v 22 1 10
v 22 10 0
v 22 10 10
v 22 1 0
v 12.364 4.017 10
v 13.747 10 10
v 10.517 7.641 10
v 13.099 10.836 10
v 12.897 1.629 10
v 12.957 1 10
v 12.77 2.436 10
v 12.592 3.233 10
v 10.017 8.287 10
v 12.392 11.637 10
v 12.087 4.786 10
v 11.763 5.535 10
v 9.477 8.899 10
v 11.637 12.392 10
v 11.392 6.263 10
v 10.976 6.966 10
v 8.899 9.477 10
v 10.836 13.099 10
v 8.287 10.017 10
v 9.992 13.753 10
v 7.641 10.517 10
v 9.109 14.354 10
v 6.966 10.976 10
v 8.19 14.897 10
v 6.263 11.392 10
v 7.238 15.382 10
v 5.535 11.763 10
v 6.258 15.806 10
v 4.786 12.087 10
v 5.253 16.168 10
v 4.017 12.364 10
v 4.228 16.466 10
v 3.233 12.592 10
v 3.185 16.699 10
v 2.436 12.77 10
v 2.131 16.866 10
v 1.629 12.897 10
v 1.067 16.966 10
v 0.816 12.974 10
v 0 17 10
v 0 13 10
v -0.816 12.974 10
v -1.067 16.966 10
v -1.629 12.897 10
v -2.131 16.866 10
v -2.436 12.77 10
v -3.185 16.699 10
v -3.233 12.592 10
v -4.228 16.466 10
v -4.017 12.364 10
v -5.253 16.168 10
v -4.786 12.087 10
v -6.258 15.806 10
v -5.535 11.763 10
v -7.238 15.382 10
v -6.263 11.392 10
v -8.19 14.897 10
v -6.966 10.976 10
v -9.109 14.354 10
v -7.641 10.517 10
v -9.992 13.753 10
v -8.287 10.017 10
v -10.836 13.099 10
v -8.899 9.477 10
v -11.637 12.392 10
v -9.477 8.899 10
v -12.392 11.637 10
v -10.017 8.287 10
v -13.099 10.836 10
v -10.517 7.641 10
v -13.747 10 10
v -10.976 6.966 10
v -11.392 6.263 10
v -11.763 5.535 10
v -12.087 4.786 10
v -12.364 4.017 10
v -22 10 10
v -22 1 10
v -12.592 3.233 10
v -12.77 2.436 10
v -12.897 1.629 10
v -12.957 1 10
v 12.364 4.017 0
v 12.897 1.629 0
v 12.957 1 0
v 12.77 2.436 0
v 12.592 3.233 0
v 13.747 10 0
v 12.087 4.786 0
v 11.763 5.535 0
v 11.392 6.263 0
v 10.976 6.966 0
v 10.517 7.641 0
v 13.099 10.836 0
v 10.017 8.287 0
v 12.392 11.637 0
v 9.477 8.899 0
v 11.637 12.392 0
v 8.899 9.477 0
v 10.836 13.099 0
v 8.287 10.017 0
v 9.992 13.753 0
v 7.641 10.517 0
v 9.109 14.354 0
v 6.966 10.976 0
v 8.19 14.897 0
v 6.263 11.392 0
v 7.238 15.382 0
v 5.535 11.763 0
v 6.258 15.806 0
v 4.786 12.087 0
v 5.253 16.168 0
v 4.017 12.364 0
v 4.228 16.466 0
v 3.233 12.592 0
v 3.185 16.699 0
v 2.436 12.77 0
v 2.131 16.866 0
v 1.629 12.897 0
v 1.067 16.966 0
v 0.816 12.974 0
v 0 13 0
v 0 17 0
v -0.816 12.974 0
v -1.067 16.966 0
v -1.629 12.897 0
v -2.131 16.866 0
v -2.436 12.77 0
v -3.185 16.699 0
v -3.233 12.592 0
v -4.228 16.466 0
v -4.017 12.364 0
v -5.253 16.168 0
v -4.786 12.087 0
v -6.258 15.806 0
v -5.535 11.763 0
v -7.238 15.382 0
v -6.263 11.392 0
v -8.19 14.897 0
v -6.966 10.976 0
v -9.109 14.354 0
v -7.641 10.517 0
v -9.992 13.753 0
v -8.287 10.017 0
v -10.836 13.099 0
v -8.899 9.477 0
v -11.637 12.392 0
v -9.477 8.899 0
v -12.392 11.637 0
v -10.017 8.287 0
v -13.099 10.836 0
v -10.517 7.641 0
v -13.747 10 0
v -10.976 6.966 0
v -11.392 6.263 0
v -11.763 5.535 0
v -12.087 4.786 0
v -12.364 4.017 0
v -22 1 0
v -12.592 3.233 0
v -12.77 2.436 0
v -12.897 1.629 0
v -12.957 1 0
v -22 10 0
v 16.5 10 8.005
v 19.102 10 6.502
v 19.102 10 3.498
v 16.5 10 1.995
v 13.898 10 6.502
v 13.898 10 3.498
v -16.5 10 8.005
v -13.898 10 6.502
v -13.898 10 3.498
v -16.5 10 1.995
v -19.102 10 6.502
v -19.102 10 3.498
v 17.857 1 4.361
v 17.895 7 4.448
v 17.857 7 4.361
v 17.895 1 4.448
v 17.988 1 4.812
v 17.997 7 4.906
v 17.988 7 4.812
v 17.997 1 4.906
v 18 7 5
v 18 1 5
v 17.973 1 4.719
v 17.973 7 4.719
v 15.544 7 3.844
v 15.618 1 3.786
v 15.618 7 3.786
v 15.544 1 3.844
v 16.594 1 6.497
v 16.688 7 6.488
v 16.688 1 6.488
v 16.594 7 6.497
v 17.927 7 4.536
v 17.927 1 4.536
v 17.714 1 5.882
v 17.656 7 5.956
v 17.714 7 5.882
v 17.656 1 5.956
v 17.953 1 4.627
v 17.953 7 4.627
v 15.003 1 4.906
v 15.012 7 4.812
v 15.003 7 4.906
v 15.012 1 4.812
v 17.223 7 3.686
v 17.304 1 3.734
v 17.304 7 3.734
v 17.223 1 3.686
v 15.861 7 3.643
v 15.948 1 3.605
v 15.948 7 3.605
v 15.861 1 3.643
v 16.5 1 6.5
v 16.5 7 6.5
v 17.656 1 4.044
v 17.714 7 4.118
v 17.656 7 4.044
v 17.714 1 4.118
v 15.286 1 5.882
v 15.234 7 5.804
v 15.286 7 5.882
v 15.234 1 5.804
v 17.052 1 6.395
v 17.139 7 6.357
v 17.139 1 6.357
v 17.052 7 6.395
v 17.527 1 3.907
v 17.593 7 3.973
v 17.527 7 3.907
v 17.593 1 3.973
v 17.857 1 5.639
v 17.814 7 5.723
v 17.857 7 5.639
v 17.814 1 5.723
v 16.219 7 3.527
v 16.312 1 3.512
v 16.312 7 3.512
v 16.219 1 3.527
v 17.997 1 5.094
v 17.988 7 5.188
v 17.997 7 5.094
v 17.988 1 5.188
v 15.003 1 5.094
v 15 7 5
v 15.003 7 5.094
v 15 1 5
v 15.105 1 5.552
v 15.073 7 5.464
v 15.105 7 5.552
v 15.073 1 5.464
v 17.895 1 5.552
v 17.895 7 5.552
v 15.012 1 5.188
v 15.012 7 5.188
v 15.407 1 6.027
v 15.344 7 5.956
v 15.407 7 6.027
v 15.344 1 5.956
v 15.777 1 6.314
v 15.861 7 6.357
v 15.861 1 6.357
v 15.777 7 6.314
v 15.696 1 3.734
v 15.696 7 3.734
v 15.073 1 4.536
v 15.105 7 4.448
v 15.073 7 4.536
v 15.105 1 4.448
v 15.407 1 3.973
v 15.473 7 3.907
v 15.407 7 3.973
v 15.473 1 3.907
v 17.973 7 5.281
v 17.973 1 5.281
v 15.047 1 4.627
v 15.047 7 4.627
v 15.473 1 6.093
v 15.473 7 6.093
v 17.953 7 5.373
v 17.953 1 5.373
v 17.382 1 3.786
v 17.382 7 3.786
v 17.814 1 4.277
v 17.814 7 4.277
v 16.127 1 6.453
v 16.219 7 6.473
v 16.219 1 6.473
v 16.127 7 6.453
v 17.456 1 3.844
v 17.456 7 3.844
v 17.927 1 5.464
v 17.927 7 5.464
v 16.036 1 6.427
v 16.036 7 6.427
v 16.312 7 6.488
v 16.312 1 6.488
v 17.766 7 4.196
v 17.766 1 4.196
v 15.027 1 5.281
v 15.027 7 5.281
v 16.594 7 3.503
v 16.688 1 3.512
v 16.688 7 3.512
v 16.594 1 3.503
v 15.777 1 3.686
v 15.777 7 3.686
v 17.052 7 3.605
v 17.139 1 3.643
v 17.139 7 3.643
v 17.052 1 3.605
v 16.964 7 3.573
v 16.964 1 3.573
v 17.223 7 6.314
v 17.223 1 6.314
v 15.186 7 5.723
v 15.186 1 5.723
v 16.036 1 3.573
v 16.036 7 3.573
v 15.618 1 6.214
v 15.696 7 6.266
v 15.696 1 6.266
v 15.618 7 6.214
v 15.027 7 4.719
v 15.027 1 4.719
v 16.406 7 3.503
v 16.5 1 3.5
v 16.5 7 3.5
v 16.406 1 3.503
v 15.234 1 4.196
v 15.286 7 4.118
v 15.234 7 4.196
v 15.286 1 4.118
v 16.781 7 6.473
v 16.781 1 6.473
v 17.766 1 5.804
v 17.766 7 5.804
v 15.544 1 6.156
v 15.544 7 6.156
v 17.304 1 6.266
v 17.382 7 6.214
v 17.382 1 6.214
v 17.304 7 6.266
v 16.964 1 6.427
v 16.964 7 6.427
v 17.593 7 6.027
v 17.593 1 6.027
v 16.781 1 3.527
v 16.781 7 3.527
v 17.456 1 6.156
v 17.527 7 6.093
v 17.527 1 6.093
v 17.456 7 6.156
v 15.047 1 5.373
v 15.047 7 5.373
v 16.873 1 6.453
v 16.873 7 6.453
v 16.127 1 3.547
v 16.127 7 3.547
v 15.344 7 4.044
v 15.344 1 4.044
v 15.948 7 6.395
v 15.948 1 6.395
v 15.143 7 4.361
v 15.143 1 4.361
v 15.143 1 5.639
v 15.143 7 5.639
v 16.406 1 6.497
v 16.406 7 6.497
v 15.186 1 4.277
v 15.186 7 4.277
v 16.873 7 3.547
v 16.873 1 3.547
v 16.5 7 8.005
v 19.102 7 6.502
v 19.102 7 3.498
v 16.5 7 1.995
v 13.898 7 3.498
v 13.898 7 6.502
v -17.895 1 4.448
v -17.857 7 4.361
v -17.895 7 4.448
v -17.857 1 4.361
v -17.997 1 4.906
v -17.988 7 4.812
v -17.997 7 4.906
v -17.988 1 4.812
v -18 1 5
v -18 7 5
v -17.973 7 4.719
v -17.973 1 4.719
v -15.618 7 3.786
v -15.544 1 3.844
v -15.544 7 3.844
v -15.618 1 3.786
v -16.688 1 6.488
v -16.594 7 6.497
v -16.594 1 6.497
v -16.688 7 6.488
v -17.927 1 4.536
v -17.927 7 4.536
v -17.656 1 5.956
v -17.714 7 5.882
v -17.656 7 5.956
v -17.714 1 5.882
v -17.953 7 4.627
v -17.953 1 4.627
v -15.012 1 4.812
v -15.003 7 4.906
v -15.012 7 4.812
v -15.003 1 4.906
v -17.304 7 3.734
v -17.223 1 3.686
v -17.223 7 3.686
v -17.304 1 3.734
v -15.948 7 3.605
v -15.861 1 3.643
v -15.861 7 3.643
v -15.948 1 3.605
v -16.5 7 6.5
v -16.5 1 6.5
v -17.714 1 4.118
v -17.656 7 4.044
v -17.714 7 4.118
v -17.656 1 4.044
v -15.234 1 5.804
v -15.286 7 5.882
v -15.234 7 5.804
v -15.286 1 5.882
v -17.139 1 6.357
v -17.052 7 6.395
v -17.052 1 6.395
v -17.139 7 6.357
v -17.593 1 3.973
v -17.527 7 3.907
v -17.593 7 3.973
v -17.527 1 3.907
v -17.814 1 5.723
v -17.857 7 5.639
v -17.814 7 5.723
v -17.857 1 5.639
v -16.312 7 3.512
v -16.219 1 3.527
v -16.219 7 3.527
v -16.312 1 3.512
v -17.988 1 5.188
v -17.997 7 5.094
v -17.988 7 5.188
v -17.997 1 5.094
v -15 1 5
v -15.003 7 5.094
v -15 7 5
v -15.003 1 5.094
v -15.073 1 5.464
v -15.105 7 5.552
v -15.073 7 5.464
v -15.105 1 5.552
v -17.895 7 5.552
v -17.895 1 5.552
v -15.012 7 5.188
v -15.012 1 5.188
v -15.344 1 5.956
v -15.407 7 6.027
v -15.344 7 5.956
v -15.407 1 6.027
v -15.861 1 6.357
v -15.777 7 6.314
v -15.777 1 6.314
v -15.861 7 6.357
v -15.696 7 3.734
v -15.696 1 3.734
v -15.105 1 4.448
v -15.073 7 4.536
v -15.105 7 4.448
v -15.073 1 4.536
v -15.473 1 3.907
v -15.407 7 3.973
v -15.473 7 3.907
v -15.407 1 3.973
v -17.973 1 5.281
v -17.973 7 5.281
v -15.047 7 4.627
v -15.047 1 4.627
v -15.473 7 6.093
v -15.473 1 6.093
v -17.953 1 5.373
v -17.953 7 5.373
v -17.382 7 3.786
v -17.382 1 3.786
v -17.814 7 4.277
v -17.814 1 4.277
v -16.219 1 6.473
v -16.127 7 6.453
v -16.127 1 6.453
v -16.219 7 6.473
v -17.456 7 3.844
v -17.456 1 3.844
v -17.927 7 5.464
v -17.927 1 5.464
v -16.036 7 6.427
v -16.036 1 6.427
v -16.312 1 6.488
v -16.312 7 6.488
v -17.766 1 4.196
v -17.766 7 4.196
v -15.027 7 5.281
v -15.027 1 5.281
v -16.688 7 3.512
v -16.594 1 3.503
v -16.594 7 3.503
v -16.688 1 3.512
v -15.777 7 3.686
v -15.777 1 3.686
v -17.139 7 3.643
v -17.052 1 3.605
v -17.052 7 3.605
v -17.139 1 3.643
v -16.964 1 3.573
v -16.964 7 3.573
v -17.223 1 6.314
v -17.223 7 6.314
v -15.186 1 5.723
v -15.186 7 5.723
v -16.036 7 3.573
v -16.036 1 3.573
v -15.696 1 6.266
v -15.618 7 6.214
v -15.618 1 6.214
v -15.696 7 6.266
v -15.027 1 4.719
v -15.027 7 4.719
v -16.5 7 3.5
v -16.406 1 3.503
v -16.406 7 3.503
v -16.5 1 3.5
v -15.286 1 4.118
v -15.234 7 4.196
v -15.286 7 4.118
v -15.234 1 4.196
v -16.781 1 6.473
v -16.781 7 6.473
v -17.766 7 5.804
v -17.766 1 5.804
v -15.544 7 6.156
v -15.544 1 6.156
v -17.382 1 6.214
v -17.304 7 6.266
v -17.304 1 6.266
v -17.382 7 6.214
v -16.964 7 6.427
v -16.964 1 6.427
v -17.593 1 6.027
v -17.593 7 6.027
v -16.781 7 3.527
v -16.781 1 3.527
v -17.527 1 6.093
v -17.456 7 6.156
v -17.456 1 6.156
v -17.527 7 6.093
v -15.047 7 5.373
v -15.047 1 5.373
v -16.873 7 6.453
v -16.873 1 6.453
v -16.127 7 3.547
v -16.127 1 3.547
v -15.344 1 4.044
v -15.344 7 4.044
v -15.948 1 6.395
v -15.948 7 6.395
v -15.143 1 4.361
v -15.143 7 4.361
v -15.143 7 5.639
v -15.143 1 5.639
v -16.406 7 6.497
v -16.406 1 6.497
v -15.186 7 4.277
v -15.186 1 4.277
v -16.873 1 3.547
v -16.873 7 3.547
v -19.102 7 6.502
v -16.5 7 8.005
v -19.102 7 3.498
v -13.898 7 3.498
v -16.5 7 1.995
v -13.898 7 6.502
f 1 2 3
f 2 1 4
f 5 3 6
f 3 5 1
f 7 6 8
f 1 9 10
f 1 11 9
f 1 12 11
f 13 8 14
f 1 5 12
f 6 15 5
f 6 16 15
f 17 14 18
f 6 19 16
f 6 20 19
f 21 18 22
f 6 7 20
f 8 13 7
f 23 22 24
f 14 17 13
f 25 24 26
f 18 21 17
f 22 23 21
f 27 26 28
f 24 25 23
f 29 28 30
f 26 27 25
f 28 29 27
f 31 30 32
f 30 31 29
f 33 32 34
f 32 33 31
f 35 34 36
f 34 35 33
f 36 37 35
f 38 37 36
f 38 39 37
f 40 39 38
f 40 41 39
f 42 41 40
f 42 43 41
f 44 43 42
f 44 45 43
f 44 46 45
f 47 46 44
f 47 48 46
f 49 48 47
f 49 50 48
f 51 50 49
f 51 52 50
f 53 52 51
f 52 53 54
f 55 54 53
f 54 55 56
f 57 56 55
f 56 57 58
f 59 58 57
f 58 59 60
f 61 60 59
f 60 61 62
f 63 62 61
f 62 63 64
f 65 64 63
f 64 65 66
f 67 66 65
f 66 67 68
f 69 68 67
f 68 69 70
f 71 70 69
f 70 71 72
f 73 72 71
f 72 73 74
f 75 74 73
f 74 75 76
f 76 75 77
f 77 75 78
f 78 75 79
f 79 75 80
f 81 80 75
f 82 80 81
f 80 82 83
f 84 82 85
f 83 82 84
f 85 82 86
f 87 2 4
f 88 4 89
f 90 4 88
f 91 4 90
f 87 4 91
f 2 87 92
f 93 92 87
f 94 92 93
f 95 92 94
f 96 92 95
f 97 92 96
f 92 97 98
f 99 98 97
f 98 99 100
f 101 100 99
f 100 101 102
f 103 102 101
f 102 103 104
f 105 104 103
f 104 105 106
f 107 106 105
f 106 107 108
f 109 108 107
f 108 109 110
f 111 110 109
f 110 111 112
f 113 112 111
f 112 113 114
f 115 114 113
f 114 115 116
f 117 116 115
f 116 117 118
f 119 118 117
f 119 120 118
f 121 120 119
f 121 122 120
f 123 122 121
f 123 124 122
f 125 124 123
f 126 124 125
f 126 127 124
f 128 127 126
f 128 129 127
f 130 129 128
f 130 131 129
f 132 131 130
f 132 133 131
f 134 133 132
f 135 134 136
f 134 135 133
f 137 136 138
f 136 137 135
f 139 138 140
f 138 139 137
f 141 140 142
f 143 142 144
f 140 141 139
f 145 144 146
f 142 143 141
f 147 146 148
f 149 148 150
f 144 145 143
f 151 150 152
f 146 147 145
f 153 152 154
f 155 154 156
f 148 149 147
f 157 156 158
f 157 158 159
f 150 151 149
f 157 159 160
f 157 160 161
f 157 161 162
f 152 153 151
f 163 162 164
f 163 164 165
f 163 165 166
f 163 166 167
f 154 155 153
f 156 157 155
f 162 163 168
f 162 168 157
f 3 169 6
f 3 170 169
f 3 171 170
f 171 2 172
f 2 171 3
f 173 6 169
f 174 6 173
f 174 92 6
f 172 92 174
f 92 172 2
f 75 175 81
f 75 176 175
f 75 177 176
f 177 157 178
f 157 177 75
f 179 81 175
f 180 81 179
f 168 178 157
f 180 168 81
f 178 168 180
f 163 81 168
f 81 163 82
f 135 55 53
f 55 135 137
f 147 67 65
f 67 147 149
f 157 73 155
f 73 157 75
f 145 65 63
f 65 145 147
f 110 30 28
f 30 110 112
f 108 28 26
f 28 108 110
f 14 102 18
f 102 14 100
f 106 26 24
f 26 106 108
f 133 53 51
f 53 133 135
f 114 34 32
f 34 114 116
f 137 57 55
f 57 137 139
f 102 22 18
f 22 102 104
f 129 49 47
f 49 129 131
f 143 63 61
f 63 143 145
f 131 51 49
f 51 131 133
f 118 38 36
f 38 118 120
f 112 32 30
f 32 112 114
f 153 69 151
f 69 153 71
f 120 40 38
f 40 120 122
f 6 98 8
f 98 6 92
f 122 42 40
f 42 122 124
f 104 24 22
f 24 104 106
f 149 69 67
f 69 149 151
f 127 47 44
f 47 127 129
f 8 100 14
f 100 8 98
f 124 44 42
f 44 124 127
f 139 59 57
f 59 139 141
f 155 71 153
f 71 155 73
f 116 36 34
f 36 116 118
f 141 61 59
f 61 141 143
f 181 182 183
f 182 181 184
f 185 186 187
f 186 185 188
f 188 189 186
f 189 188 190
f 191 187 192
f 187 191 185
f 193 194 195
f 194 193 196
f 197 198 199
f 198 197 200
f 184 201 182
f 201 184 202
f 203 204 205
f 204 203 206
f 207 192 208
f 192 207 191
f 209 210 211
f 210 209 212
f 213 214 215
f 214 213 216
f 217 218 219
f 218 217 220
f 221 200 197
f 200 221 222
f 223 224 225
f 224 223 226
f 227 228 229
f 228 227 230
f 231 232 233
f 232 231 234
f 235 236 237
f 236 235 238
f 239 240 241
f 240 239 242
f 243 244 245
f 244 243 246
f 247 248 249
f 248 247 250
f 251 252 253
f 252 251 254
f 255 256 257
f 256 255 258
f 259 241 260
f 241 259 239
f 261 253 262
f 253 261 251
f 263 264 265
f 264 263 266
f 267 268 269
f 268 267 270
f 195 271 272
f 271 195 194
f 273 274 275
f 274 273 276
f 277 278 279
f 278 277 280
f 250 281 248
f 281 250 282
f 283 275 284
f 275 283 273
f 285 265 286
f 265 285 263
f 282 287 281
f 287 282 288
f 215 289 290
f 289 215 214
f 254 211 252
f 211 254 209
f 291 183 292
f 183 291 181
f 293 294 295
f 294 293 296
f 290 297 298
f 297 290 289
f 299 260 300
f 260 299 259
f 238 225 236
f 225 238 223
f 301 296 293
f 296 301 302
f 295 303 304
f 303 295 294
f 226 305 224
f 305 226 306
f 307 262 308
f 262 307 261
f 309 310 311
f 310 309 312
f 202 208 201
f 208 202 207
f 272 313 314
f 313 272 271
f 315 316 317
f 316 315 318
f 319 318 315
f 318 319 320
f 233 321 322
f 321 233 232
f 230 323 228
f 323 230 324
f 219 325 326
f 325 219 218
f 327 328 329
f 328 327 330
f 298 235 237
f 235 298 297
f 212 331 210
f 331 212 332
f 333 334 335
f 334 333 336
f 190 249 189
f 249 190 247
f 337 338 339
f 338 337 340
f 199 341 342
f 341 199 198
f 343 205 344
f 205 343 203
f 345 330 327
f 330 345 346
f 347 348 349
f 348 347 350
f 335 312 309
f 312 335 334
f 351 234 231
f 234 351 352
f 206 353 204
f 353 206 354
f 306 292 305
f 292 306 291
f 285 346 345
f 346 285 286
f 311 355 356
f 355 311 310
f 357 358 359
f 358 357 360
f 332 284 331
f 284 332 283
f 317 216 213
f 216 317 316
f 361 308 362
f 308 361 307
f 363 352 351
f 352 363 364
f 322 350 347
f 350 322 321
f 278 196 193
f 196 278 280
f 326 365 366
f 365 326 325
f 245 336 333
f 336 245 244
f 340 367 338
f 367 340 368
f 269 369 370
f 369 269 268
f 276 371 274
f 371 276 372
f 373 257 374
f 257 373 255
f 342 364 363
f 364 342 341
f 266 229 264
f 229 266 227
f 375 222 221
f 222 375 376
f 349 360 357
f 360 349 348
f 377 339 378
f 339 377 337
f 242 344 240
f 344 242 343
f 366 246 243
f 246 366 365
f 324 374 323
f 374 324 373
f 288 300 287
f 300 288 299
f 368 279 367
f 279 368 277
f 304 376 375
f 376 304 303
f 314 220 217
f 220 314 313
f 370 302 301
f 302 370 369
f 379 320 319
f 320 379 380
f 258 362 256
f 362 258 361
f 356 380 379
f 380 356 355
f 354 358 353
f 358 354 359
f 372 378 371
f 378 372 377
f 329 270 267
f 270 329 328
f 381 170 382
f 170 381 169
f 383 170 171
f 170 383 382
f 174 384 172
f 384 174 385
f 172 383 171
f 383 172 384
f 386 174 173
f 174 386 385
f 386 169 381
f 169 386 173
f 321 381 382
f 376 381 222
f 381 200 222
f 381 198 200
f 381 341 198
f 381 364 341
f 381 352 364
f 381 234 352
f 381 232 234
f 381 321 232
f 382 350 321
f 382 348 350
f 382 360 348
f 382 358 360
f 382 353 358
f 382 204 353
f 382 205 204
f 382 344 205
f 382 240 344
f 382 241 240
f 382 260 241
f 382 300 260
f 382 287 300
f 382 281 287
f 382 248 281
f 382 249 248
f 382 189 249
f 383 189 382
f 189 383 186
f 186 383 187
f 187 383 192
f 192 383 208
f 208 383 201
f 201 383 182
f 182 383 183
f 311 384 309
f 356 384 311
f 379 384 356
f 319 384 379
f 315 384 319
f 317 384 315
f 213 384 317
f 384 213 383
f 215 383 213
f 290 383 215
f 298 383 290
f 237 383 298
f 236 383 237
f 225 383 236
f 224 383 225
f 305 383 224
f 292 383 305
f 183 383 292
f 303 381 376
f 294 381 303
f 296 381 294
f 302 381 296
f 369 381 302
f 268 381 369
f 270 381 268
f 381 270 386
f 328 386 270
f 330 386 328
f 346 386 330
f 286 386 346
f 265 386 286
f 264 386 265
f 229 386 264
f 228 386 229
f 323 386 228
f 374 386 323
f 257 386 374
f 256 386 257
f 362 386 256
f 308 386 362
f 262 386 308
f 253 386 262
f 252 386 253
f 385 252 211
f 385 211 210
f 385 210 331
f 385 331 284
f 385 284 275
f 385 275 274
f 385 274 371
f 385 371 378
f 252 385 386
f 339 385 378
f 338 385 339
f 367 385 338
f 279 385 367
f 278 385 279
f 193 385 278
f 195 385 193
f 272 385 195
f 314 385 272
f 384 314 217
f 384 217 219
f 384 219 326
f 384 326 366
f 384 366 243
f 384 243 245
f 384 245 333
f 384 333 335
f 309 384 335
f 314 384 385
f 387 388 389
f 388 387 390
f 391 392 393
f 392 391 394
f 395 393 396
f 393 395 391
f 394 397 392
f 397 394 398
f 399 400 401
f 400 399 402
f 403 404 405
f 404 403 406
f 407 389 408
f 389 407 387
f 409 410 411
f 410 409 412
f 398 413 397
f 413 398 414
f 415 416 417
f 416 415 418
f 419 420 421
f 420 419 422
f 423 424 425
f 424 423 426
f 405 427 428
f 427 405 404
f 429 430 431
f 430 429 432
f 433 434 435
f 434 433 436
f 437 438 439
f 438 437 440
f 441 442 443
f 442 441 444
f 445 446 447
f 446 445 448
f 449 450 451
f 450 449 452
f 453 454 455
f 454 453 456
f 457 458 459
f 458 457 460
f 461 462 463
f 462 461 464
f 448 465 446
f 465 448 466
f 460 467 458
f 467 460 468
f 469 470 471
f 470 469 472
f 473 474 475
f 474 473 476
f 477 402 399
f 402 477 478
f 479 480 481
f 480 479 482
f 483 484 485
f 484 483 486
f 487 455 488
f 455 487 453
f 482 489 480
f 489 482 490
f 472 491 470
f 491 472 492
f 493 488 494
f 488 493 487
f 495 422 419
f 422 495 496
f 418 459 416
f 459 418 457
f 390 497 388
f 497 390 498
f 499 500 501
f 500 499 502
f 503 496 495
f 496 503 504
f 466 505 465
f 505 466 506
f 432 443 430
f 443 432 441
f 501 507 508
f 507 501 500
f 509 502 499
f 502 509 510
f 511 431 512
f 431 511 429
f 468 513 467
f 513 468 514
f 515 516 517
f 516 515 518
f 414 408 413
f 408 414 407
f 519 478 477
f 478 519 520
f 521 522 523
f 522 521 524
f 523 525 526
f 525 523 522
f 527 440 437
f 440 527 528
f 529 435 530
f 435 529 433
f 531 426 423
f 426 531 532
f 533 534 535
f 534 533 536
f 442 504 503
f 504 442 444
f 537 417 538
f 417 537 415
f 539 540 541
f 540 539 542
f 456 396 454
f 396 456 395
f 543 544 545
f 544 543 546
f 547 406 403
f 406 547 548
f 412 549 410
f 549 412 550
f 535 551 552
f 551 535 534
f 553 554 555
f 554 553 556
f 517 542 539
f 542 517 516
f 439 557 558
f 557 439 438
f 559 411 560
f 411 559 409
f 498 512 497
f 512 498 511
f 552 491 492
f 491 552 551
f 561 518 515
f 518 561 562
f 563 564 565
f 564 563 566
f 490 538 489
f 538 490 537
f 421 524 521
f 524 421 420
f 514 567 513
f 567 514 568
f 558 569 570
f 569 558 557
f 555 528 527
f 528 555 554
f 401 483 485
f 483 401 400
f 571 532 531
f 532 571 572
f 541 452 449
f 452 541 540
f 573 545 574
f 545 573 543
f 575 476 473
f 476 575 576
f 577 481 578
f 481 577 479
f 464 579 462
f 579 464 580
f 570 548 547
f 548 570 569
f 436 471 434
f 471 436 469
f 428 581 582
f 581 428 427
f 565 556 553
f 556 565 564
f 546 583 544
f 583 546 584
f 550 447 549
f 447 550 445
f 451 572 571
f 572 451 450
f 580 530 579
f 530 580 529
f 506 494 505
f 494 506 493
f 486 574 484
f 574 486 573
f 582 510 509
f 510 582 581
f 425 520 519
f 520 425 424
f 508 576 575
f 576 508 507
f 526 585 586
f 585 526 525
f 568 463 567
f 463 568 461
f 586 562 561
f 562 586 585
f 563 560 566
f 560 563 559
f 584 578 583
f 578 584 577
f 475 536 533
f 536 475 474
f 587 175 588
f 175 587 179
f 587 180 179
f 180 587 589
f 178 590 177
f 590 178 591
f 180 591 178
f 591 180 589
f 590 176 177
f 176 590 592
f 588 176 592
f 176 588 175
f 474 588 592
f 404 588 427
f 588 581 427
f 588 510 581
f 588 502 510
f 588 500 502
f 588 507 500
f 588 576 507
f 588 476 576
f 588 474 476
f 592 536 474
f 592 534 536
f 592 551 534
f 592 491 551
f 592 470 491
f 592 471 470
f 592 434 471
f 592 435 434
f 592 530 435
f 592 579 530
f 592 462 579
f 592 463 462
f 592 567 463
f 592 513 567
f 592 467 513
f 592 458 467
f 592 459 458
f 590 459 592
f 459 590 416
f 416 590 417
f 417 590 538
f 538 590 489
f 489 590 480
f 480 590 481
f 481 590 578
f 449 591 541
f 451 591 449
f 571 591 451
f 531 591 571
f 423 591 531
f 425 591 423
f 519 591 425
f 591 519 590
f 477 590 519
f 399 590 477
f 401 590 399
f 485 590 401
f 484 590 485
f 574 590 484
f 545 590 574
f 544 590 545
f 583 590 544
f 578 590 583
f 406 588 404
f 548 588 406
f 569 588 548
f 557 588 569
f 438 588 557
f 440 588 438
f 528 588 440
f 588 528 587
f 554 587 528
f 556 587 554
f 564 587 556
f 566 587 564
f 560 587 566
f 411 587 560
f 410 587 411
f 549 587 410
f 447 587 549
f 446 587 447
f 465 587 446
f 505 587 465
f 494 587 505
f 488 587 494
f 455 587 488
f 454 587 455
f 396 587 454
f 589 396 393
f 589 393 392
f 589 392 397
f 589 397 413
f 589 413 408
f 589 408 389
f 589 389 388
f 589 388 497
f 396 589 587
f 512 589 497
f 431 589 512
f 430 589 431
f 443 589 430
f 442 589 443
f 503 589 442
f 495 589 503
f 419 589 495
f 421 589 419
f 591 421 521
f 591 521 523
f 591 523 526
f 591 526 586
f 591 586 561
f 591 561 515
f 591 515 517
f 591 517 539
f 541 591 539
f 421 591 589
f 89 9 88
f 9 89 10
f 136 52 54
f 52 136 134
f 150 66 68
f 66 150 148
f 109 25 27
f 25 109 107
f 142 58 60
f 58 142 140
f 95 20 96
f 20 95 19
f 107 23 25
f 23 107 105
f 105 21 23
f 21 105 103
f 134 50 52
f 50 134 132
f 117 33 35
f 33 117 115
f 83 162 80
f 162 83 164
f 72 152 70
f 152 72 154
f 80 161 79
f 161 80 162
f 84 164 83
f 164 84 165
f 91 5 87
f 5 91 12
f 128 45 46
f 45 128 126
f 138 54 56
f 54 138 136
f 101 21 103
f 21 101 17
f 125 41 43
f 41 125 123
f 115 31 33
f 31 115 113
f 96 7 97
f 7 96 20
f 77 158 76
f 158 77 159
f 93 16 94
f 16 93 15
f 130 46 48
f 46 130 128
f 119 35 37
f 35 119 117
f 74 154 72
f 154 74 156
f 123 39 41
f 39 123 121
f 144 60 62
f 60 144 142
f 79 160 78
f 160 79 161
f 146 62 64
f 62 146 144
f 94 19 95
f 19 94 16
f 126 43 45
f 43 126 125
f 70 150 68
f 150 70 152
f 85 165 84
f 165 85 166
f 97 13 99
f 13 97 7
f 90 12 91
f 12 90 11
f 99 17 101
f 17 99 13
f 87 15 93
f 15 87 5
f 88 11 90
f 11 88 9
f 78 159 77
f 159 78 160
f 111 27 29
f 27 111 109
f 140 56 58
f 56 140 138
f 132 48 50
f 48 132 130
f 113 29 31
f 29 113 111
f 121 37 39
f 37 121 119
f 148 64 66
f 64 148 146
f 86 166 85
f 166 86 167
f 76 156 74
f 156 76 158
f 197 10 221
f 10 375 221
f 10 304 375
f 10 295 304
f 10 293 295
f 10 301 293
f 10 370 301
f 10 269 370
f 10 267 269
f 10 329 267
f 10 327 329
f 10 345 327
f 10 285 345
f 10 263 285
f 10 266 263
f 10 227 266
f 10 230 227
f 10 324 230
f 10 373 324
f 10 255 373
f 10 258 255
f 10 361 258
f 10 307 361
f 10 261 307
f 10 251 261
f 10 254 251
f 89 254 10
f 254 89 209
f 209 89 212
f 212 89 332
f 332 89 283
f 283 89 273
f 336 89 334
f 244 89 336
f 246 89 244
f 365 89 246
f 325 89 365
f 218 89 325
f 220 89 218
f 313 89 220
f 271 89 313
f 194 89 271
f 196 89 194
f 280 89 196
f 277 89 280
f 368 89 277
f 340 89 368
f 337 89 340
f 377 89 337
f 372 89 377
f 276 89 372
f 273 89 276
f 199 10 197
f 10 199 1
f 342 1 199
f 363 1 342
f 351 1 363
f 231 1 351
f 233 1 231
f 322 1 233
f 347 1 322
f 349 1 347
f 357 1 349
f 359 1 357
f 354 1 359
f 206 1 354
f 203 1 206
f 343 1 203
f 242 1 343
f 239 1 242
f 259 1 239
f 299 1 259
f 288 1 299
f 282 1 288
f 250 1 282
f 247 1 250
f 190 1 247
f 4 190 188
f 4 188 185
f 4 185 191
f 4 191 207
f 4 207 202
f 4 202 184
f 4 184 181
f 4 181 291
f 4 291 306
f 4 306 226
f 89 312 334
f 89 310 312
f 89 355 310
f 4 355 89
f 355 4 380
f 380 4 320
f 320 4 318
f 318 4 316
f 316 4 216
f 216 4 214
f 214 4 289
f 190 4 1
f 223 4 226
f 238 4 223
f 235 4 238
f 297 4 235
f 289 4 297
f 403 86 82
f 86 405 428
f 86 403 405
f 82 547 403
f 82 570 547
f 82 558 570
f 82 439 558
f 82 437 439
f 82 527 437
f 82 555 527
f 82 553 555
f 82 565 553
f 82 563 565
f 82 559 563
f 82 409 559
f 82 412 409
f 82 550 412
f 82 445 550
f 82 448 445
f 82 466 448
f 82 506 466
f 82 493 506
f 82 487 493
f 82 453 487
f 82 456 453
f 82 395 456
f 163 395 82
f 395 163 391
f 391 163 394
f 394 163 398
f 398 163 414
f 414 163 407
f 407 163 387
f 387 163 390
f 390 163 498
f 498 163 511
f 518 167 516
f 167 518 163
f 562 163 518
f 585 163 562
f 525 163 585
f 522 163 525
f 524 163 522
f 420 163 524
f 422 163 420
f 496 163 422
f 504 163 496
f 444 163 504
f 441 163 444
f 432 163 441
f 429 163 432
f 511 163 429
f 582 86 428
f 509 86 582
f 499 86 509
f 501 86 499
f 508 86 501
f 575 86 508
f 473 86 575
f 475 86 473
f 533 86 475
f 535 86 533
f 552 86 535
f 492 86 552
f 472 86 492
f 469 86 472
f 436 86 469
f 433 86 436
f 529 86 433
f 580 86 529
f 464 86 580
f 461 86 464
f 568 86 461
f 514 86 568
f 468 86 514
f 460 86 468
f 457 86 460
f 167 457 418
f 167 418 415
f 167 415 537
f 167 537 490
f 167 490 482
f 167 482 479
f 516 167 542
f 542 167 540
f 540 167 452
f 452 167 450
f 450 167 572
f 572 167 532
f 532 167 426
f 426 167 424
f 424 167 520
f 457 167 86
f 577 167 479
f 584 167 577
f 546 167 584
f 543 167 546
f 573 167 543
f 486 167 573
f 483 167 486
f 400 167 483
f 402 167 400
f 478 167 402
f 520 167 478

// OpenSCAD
$fn=100;




module bride(diam_motor = 0) {
    hauteur_bride = 4;
    diam_bride = diam_motor + 2*hauteur_bride;

    largeur_bride = 44;
    epaisseur_bride = 10;
    v_spacing = 1;

    spacing_vis = 33;
    diam_vis = 1.5*2;
    diam_nut = 6.01; // M3
   
    
    difference() {
    union() {
        
        cylinder(d=diam_bride, h = epaisseur_bride);
        
        for(i=[0, 1]) mirror([i, 0, 0]) {
            translate([diam_motor/2, 0])
                cube([(largeur_bride - diam_motor)/2, 10, epaisseur_bride]);
        }
    }
    #union() {
        cylinder(d=diam_motor, h = epaisseur_bride);
        translate([-largeur_bride/2, - diam_bride/2,0])
            cube([largeur_bride, diam_bride/2 + v_spacing, epaisseur_bride*2]);
        
        for(i=[0,1]) mirror([i, 0, 0]) {
            translate([spacing_vis/2, 0, epaisseur_bride/2]) rotate([-90, 0, 0]) {
                cylinder(d=diam_vis, h=20);
                translate([0, 0, 7]) rotate([0,0,360/12])cylinder(d=diam_nut, h=20, $fn=6);
            }
        }
            
    }
    }
    
}

//bride(26);
bride(26);
